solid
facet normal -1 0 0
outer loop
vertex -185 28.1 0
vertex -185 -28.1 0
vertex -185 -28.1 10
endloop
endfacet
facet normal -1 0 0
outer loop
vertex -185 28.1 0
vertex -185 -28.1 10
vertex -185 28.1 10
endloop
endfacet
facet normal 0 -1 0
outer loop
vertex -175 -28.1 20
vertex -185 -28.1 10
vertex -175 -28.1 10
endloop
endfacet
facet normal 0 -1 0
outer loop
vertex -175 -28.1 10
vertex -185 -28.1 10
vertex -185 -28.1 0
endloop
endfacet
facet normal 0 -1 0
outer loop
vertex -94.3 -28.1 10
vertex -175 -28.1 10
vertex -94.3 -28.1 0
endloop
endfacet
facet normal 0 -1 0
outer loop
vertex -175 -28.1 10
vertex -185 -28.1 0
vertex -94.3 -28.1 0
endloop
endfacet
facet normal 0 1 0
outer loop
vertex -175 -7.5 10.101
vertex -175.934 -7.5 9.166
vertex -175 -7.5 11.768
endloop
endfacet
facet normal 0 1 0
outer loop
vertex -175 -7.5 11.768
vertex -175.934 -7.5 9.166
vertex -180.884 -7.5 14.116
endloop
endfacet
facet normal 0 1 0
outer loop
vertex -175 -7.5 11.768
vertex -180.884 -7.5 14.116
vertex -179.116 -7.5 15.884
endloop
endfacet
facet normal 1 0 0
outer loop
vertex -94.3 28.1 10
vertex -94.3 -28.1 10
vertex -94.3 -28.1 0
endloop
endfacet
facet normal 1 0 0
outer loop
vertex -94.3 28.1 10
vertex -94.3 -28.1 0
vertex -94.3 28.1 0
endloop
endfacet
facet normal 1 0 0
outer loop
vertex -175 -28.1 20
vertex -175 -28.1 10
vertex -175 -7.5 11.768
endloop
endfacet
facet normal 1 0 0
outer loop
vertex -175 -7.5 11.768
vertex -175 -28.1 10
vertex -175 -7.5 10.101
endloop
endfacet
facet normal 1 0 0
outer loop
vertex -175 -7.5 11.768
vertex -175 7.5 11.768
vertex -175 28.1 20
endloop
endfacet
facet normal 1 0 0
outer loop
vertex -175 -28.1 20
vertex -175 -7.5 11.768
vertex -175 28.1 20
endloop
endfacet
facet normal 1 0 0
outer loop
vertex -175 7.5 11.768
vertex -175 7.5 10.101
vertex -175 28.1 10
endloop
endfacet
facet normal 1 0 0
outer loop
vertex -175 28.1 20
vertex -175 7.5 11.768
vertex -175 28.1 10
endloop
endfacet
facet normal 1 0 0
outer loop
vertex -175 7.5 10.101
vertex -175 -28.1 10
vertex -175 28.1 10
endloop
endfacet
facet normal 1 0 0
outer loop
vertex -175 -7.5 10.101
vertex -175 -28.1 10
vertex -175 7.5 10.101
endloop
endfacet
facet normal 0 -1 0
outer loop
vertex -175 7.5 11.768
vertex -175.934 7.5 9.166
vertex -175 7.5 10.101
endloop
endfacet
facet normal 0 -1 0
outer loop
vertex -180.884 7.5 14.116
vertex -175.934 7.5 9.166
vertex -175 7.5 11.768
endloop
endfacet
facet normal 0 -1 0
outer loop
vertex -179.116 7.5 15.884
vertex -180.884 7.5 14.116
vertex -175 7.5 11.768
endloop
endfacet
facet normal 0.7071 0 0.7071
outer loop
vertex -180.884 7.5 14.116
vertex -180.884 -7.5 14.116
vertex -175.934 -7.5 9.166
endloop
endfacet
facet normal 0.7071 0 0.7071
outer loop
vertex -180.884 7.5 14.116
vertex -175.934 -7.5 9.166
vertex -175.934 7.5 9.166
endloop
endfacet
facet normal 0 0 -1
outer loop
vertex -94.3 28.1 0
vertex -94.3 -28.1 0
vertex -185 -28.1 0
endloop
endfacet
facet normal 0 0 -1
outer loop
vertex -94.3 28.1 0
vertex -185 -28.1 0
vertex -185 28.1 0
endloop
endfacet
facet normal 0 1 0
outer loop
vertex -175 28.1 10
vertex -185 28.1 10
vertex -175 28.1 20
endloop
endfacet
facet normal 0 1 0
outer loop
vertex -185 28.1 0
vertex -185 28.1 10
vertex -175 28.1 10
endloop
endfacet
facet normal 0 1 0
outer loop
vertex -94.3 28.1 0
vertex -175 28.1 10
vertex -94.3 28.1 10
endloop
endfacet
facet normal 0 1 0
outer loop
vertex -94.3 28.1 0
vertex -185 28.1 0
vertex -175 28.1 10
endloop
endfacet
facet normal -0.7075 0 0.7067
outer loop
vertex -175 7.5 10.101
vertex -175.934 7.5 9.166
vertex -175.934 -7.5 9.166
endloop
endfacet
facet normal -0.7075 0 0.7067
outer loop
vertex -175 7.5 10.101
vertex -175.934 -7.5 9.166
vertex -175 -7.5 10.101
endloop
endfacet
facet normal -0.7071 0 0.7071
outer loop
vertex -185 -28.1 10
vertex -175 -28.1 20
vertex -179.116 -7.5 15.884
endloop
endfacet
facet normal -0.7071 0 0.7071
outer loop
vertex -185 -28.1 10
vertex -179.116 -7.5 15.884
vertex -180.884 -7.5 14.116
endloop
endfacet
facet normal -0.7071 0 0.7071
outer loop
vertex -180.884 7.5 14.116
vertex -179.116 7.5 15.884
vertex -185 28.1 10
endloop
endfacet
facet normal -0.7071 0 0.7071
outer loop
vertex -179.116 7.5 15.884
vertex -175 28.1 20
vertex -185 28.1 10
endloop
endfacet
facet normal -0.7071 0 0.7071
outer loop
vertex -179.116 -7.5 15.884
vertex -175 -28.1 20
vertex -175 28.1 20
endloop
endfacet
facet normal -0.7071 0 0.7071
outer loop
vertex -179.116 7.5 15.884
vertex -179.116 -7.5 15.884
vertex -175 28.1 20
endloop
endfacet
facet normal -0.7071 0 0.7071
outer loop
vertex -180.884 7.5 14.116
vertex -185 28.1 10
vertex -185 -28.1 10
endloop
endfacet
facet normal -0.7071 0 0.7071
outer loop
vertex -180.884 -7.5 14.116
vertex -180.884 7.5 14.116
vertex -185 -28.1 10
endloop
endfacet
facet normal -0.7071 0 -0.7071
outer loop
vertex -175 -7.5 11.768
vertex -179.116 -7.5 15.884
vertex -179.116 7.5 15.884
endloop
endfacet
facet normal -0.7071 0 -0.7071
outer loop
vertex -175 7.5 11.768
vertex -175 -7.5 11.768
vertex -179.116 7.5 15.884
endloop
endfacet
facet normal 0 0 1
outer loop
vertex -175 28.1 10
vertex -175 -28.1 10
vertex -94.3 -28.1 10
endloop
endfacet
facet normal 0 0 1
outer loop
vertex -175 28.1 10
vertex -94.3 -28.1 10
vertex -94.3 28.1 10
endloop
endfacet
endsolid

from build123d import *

# Parameters (mm, degrees)
SKETCH1_W           = 350
SKETCH1_H           = 56.2
BOSS_EXTRUDE1_DEPTH = 10
SKETCH2_W           = 56.2
SKETCH2_H           = 56.2
CUT_EXTRUDE1_DEPTH  = 5
SKETCH3_W           = 10
SKETCH3_H           = 56.2
BOSS_EXTRUDE2_DEPTH = 10
SKETCH4_W           = 10
SKETCH4_H           = 56.2
BOSS_EXTRUDE3_DEPTH = 10
CUT_EXTRUDE2_DEPTH  = 56.2
SKETCH6_W           = 10
SKETCH6_H           = 56.2
BOSS_EXTRUDE4_DEPTH = 10
SKETCH7_W           = 10
SKETCH7_H           = 56.2
BOSS_EXTRUDE5_DEPTH = 10
CUT_EXTRUDE3_DEPTH  = 56.2
SKETCH9_W           = 30
SKETCH9_H           = 30
CUT_EXTRUDE4_DEPTH  = 5
SKETCH10_R          = 3
CUT_EXTRUDE5_DEPTH  = 5
SKETCH11_W          = 2.5
SKETCH11_H          = 15
CUT_EXTRUDE6_DEPTH  = 7
SKETCH12_W          = 2.5
SKETCH12_H          = 15
CUT_EXTRUDE7_DEPTH  = 7
SKETCH14_W          = 279.3
SKETCH14_H          = 56.2
CUT_EXTRUDE10_DEPTH = 10


with BuildPart() as part:
    # Sketch1 → Boss-Extrude1 (new body)
    with BuildSketch(Plane.XY):
        Rectangle(SKETCH1_W, SKETCH1_H)
    extrude(amount=BOSS_EXTRUDE1_DEPTH)

    # Sketch2 → Cut-Extrude1 (cut)
    with BuildSketch(Plane.XY.offset(10)):
        Rectangle(SKETCH2_W, SKETCH2_H)
    extrude(amount=-CUT_EXTRUDE1_DEPTH, mode=Mode.SUBTRACT)

    # Sketch3 → Boss-Extrude2 (add)
    with BuildSketch(Plane(origin=(175, 0, 0), x_dir=(0, 0, -1), z_dir=(1, 0, 0))):
        with Locations((-5, 0)):
            Rectangle(SKETCH3_W, SKETCH3_H)
    extrude(amount=BOSS_EXTRUDE2_DEPTH)

    # Sketch4 → Boss-Extrude3 (add)
    with BuildSketch(Plane.XY.offset(10)):
        with Locations((180, 0)):
            Rectangle(SKETCH4_W, SKETCH4_H)
    extrude(amount=BOSS_EXTRUDE3_DEPTH)

    # Sketch5 → Cut-Extrude2 (cut)
    with BuildSketch(Plane(origin=(0, 28.1, 0), x_dir=(1, 0, 0), z_dir=(0, 1, 0))):
        Polygon((175, -20), (185, -10), (185, -20), align=None)
    extrude(amount=-CUT_EXTRUDE2_DEPTH, mode=Mode.SUBTRACT)

    # Sketch6 → Boss-Extrude4 (add)
    with BuildSketch(Plane.ZY.offset(175)):
        with Locations((5, 0)):
            Rectangle(SKETCH6_W, SKETCH6_H)
    extrude(amount=BOSS_EXTRUDE4_DEPTH)

    # Sketch7 → Boss-Extrude5 (add)
    with BuildSketch(Plane.XY.offset(10)):
        with Locations((-180, 0)):
            Rectangle(SKETCH7_W, SKETCH7_H)
    extrude(amount=BOSS_EXTRUDE5_DEPTH)

    # Sketch8 → Cut-Extrude3 (cut)
    with BuildSketch(Plane(origin=(0, 28.1, 0), x_dir=(1, 0, 0), z_dir=(0, 1, 0))):
        Polygon((-175, -20), (-185, -10), (-185, -20), align=None)
    extrude(amount=-CUT_EXTRUDE3_DEPTH, mode=Mode.SUBTRACT)

    # Sketch9 → Cut-Extrude4 (cut)
    with BuildSketch(Plane.XY.offset(5)):
        Rectangle(SKETCH9_W, SKETCH9_H)
    extrude(amount=-CUT_EXTRUDE4_DEPTH, mode=Mode.SUBTRACT)

    # Sketch10 → Cut-Extrude5 (cut)
    with BuildSketch(Plane.XY.offset(5)):
        with Locations((21.55, 21.55)):
            Circle(SKETCH10_R)
        with Locations((-21.55, -21.55)):
            Circle(SKETCH10_R)
        with Locations((-21.55, 21.55)):
            Circle(SKETCH10_R)
        with Locations((21.55, -21.55)):
            Circle(SKETCH10_R)
    extrude(amount=-CUT_EXTRUDE5_DEPTH, mode=Mode.SUBTRACT)

    # Sketch11 → Cut-Extrude6 (cut)
    with BuildSketch(Plane(origin=(97.5, 0, 97.5), x_dir=(0.7071067811865478, 0, -0.7071067811865472), z_dir=(0.7071067811865472, 0, 0.7071067811865478))):
        with Locations((116.672618896, 0)):
            Rectangle(SKETCH11_W, SKETCH11_H)
    extrude(amount=-CUT_EXTRUDE6_DEPTH, mode=Mode.SUBTRACT)

    # Sketch12 → Cut-Extrude7 (cut)
    with BuildSketch(Plane(origin=(-97.5, 0, 97.5), x_dir=(0.7071067811865478, 0, 0.7071067811865472), z_dir=(-0.7071067811865472, 0, 0.7071067811865478))):
        with Locations((-116.672618896, 0)):
            Rectangle(SKETCH12_W, SKETCH12_H)
    extrude(amount=-CUT_EXTRUDE7_DEPTH, mode=Mode.SUBTRACT)

    # Sketch14 → Cut-Extrude10 (cut)
    with BuildSketch(Plane.XY.offset(10)):
        with Locations((45.35, 0)):
            Rectangle(SKETCH14_W, SKETCH14_H)
    extrude(amount=-CUT_EXTRUDE10_DEPTH, mode=Mode.SUBTRACT)


with BuildPart() as body_2:
    # of the pieces the cut leaves, the one that is kept (cut_extrude10_keep)
    add(part.part.solids().sort_by_distance((-185, -28.1, 0))[0])


solid = body_2.part
